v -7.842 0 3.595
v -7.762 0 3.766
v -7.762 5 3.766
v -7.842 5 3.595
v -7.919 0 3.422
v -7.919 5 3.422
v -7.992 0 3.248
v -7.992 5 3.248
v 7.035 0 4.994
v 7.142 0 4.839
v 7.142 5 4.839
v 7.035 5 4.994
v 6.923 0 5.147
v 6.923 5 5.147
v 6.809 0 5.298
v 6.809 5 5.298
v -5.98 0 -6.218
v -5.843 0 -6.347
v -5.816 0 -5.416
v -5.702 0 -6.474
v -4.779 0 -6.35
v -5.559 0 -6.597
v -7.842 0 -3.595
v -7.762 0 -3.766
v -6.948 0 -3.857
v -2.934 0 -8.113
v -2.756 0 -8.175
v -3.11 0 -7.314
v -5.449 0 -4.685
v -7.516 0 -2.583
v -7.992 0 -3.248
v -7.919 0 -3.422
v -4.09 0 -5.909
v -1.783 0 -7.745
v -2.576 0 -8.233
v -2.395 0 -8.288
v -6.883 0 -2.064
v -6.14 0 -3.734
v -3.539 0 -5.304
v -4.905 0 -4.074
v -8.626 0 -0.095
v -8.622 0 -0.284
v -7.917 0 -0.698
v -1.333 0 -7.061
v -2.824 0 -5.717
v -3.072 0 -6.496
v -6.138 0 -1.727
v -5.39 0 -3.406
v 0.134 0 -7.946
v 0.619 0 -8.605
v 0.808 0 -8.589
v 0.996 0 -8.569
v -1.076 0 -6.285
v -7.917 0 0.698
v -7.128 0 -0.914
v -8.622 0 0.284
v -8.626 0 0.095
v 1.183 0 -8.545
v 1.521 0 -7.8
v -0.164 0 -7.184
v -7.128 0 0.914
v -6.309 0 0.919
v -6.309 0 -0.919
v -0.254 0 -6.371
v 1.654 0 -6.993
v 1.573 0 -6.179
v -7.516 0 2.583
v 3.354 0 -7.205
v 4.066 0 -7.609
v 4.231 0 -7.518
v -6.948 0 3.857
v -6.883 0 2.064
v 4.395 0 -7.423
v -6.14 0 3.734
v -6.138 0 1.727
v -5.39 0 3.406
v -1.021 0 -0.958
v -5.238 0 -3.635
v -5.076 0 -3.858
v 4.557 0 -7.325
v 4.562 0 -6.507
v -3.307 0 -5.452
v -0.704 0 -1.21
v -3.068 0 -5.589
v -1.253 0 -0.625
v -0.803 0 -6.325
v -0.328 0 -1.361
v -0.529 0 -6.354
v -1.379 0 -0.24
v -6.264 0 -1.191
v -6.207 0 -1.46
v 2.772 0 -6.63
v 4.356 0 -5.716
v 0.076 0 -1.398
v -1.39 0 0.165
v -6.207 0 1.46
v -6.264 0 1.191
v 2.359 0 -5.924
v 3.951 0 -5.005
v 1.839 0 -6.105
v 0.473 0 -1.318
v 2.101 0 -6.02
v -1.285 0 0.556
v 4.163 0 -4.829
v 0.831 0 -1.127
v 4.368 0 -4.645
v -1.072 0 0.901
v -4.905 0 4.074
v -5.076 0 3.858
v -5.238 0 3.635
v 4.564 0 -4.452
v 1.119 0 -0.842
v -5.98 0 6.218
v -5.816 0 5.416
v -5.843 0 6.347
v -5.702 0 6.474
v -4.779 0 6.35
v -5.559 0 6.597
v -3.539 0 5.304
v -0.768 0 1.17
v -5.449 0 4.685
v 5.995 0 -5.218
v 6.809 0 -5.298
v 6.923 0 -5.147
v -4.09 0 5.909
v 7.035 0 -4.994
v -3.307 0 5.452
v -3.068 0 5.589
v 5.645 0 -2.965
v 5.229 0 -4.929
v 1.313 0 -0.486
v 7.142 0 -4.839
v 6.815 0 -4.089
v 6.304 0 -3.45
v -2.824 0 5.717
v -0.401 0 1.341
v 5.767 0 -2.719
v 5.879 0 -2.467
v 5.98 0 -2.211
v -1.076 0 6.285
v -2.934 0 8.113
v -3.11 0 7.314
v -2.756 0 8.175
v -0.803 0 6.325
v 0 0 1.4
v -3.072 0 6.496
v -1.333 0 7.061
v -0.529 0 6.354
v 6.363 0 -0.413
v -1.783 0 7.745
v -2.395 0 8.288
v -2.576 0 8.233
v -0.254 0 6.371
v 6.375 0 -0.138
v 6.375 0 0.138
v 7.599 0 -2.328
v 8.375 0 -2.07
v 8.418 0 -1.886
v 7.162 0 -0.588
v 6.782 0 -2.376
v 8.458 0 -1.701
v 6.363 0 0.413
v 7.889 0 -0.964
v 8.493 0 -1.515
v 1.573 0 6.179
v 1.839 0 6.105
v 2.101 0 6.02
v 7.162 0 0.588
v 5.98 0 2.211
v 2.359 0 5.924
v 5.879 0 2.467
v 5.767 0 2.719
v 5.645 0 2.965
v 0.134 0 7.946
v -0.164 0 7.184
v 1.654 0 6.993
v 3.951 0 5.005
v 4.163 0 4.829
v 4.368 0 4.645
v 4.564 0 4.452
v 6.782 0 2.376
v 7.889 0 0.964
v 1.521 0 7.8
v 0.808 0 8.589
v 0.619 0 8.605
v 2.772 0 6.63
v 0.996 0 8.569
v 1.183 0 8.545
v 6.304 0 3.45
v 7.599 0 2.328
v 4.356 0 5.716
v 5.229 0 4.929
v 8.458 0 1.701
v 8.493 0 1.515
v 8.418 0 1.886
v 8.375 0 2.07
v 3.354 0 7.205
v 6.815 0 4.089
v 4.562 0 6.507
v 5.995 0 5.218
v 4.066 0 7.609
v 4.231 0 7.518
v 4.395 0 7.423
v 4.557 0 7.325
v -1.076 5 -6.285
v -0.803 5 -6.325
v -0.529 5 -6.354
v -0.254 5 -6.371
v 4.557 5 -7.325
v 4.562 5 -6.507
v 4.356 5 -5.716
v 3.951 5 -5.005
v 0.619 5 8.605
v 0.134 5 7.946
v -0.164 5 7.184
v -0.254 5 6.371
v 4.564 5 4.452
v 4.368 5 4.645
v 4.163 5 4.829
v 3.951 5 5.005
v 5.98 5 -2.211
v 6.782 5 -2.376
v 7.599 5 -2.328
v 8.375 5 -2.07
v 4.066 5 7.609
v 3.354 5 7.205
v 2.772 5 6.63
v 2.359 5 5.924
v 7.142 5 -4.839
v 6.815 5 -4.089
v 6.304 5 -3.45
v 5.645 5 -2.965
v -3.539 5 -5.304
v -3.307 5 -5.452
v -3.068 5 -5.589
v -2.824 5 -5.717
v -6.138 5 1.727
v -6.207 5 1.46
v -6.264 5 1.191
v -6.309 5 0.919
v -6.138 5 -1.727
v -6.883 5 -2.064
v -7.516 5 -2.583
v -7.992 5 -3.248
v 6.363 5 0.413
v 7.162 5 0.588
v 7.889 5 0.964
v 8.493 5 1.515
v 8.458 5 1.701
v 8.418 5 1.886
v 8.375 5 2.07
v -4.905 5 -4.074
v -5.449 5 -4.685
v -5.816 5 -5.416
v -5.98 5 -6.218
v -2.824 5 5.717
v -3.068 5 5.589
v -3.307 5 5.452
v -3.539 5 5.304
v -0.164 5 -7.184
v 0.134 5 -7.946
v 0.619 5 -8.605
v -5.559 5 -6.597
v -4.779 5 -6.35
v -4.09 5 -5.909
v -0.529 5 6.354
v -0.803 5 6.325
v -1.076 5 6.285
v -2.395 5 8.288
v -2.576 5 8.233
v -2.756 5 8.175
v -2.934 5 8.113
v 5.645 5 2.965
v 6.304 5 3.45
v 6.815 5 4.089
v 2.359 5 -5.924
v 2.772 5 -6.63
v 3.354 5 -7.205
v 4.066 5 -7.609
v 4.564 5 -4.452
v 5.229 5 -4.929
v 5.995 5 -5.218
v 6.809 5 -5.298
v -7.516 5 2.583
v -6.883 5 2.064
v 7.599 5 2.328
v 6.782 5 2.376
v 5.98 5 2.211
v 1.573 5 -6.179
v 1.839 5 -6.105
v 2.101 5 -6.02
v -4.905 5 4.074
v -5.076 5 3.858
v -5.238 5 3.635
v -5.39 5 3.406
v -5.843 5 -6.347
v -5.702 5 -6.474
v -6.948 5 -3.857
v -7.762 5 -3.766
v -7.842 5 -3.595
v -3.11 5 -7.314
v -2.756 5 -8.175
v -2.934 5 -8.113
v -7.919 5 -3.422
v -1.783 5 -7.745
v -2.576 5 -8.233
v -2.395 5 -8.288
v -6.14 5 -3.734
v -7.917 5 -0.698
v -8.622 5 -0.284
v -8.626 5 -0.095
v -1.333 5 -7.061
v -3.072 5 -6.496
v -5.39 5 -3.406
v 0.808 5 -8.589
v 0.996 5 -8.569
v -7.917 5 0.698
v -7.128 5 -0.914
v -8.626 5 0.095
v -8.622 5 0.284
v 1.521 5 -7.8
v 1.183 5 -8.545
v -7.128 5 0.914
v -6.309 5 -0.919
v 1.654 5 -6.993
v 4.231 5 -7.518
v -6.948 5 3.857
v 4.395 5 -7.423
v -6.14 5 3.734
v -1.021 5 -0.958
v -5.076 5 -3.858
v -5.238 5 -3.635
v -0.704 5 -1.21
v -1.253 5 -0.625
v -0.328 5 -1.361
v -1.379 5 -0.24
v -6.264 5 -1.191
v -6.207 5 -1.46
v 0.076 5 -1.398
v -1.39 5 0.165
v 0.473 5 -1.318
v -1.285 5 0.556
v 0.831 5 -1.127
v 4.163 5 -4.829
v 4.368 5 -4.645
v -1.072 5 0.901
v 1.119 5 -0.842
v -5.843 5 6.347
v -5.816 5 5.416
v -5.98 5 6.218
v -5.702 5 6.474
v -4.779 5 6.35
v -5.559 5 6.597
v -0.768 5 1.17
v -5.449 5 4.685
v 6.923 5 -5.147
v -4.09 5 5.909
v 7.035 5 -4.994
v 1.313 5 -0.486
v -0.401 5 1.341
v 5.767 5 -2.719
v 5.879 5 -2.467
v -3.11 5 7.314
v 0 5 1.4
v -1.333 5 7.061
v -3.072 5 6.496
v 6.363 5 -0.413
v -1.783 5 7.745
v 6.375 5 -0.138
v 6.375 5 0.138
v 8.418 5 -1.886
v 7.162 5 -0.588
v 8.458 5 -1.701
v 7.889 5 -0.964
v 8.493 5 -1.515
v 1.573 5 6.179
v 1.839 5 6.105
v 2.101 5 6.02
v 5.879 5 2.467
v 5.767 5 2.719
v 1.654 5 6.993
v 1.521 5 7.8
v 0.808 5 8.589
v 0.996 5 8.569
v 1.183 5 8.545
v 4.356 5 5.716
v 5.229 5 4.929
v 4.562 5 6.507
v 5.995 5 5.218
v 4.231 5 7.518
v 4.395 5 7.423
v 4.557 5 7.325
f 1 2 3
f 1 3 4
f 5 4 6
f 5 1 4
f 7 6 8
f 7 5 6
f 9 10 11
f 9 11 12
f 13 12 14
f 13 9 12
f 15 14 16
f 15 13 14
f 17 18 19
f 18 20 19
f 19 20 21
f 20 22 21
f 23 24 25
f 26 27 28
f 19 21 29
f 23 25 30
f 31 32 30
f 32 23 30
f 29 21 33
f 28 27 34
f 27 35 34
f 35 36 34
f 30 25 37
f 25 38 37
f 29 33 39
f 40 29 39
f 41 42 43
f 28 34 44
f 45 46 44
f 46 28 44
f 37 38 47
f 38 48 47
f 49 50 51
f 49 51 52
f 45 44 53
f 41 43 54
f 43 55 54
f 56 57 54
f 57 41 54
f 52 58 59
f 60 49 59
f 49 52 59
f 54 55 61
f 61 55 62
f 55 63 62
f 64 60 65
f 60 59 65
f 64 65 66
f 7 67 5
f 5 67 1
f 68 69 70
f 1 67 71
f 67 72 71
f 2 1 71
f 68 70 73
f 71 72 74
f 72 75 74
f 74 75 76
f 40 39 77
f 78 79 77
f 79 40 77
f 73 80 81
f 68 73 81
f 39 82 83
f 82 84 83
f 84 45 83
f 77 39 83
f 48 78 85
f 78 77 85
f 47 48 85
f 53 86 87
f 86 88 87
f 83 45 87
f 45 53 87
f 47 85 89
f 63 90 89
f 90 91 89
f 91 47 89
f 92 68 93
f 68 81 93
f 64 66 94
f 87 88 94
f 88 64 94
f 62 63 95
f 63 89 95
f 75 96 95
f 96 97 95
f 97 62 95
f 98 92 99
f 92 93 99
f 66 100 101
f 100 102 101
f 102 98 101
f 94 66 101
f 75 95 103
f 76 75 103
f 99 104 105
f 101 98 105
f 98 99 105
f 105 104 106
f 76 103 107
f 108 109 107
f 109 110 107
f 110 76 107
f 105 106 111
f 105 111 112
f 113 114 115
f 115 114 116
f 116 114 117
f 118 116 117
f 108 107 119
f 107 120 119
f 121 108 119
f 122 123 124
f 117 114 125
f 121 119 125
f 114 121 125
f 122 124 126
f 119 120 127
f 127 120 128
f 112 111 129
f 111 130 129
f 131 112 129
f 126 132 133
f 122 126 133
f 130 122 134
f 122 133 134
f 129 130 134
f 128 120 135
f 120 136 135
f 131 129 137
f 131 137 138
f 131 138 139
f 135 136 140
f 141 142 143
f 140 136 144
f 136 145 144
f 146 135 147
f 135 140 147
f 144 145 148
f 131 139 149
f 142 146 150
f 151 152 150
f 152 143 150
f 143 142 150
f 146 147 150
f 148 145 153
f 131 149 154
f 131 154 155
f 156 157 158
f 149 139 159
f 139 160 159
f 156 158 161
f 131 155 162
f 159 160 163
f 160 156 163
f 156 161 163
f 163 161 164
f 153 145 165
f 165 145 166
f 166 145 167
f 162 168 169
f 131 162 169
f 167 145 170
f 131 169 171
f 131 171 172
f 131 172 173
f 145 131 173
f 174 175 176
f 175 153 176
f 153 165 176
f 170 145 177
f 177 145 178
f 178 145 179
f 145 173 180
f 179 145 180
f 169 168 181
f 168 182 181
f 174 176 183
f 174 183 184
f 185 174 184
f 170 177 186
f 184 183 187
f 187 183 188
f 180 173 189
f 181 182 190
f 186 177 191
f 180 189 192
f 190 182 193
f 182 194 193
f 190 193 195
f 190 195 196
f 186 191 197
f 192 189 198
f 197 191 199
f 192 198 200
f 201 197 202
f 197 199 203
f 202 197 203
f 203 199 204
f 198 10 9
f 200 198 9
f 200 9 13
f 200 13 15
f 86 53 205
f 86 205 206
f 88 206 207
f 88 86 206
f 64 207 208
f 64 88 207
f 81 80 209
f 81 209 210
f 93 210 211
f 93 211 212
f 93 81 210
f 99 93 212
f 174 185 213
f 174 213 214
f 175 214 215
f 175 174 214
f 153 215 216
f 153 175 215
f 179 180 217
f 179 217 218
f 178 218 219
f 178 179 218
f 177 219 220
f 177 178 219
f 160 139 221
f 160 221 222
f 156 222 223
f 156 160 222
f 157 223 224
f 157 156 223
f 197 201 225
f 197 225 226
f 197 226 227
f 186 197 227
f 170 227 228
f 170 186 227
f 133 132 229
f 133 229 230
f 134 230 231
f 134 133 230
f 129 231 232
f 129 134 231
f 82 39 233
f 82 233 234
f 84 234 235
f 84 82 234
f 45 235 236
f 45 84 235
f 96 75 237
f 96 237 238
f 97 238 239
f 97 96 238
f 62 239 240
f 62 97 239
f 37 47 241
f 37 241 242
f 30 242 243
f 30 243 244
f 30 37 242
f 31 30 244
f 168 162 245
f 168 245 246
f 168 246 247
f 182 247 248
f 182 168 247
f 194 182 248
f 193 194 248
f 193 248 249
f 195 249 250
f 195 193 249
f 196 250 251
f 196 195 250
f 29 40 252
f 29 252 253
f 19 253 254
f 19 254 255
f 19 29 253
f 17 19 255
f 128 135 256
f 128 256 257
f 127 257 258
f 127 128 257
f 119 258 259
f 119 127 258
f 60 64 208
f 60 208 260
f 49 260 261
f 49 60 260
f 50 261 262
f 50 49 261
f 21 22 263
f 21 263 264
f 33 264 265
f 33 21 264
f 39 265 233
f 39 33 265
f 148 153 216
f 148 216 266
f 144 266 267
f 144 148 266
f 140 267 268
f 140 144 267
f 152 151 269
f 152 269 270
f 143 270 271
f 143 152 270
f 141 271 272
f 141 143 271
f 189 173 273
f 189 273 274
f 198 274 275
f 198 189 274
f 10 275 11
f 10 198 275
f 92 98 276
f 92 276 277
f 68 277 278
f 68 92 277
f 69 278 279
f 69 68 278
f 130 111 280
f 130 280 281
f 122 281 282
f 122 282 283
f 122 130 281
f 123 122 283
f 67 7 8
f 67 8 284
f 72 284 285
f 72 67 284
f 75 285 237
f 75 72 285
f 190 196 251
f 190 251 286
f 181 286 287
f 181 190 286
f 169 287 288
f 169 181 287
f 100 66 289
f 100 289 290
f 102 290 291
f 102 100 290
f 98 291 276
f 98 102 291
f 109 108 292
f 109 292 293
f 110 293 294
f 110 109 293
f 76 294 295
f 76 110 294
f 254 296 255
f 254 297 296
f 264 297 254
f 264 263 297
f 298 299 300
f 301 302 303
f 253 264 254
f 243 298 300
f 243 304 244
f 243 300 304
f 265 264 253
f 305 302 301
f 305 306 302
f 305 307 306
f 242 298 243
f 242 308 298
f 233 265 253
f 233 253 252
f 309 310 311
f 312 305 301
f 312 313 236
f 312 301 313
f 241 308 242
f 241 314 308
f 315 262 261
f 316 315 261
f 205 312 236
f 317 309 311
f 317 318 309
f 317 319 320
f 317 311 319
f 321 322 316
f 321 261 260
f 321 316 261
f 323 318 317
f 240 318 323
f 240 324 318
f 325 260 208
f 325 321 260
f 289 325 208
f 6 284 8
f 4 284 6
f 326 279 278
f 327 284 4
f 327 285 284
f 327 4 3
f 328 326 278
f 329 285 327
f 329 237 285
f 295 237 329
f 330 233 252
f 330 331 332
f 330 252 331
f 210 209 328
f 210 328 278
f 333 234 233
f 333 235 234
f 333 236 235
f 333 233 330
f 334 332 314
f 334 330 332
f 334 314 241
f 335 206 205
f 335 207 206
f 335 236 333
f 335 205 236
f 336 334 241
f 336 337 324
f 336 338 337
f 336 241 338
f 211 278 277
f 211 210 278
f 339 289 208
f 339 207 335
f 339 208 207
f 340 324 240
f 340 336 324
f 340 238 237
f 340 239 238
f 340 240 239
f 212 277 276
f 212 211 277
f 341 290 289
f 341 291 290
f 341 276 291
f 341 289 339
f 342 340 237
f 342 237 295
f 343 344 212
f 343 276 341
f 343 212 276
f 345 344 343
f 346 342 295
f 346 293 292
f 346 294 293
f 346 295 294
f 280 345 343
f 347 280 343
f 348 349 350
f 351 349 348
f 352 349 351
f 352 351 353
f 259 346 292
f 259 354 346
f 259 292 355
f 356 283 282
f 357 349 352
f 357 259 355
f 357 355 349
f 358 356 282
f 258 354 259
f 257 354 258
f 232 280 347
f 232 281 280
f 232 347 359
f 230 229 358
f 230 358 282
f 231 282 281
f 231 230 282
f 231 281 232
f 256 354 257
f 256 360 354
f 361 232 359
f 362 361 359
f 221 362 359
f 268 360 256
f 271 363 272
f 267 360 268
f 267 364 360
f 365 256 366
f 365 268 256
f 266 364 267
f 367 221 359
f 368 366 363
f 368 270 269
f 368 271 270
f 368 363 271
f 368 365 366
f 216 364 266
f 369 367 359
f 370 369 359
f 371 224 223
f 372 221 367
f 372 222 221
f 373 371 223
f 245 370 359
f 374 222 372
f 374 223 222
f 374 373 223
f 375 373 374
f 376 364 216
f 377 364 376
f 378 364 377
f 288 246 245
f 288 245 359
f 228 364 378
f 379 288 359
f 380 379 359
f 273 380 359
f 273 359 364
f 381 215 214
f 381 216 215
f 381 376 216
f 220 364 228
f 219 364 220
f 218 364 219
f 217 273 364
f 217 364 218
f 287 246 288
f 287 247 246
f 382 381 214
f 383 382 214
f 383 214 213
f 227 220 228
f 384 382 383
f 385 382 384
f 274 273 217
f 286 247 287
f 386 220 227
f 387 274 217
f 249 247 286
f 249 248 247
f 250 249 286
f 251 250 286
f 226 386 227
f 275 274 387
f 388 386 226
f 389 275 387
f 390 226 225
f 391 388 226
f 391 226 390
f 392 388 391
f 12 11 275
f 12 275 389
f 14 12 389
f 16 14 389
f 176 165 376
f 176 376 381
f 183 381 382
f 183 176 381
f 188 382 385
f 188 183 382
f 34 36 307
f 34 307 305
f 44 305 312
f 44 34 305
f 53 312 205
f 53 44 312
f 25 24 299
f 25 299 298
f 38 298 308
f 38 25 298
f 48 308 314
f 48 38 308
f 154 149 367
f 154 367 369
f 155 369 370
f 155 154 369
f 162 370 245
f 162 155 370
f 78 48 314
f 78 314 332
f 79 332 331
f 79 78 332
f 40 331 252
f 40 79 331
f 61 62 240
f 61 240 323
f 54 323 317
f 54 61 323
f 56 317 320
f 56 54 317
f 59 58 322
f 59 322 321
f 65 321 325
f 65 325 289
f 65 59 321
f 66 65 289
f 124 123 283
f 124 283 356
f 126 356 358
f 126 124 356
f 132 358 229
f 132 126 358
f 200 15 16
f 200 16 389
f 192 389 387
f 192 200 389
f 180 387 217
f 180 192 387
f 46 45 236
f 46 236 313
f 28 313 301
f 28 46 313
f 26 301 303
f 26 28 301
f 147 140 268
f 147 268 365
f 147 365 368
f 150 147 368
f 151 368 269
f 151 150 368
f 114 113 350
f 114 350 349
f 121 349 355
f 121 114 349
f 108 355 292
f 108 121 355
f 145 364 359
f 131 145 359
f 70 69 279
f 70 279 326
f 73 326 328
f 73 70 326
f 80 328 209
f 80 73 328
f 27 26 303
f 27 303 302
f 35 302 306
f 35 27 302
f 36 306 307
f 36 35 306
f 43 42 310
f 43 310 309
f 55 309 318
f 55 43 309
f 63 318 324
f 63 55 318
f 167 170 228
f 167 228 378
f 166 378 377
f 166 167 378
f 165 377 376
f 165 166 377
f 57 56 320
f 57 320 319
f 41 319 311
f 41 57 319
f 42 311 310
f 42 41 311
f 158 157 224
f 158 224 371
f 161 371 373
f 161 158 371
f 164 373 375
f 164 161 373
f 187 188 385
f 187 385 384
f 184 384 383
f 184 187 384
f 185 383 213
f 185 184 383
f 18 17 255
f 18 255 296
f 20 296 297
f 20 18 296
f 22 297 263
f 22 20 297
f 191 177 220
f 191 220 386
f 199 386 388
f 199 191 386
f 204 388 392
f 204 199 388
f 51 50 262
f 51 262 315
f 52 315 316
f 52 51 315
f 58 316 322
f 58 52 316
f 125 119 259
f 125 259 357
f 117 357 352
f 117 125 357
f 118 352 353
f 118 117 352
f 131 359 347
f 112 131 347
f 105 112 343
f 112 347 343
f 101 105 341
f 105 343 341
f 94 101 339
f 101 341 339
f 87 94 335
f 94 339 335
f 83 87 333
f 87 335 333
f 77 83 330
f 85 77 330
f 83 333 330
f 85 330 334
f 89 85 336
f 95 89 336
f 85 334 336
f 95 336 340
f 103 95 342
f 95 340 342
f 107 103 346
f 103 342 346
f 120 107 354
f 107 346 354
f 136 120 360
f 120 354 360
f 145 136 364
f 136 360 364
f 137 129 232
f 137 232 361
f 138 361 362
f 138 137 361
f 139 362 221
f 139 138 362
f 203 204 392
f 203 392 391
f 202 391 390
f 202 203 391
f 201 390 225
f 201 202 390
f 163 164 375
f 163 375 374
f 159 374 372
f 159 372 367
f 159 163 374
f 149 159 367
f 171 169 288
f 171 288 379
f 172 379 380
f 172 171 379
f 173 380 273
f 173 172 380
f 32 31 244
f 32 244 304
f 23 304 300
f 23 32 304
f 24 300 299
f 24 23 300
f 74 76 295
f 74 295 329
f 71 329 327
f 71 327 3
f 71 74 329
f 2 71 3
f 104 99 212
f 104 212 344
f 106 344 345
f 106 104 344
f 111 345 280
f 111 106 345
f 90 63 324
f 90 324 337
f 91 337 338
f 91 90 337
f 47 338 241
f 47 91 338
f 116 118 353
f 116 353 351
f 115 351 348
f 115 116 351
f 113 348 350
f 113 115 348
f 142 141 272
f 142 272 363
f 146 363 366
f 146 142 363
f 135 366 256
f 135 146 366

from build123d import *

# Parameters (mm, degrees)
SKETCH1_R           = 56.531668112
BOSS_EXTRUDE1_DEPTH = 5
SKETCH2_R           = 93.360470672
CUT_EXTRUDE1_DEPTH  = 83.481553238
CUT_EXTRUDE2_DEPTH  = 93.989824493


with BuildPart() as part:
    # Sketch1 → Boss-Extrude1 (new body)
    with BuildSketch(Plane(origin=(0, 0, 0), x_dir=(1, 0, 0), z_dir=(0, 1, 0))):
        Circle(SKETCH1_R)
    extrude(amount=BOSS_EXTRUDE1_DEPTH)

    # Sketch2 → Cut-Extrude1 (cut, through all)
    with BuildSketch(Plane(origin=(0.053951493, 9.696123263, -2.690451675), x_dir=(0, 0, 1), z_dir=(0, 1, 0))):
        with Locations((2.690451675, -0.053951493)):
            Circle(SKETCH2_R)
        with BuildLine():
            ThreePointArc((7.987976033, 6.754966533), (7.789005891, 5.548363877), (7.142485611, 4.510341424))
            ThreePointArc((7.142485611, 4.510341424), (7.428743082, 4.212425253), (7.695105184, 3.89659521))
            ThreePointArc((7.695105184, 3.89659521), (8.795021012, 4.431070894), (10.015811815, 4.502826734))
            ThreePointArc((10.015811815, 4.502826734), (10.161652833, 4.259548507), (10.299417449, 4.011607367))
            ThreePointArc((10.299417449, 4.011607367), (9.626879667, 2.990249439), (8.614052233, 2.304932231))
            ThreePointArc((8.614052233, 2.304932231), (8.754388023, 1.916340863), (8.869262259, 1.519476535))
            ThreePointArc((8.869262259, 1.519476535), (10.091476214, 1.560368296), (11.235909836, 1.129380165))
            ThreePointArc((11.235909836, 1.129380165), (11.270192066, 0.84781556), (11.295199558, 0.56527614))
            ThreePointArc((11.295199558, 0.56527614), (10.265382027, -0.094234996), (9.061374505, -0.308349388))
            ThreePointArc((9.061374505, -0.308349388), (9.03152328, -0.720424975), (8.975046852, -1.12970214))
            ThreePointArc((8.975046852, -1.12970214), (10.108227036, -1.589464859), (10.978420508, -2.448675198))
            ThreePointArc((10.978420508, -2.448675198), (10.895216241, -2.719841104), (10.803142587, -2.98812517))
            ThreePointArc((10.803142587, -2.98812517), (9.594110113, -3.171754047), (8.407106342, -2.8776433))
            ThreePointArc((8.407106342, -2.8776433), (8.212229649, -3.241951493), (7.994167845, -3.592873756))
            ThreePointArc((7.994167845, -3.592873756), (8.84237711, -4.473793803), (9.287866075, -5.612661077))
            ThreePointArc((9.287866075, -5.612661077), (9.101562084, -5.826541234), (8.908327655, -6.034181196))
            ThreePointArc((8.908327655, -6.034181196), (7.729132938, -5.710176712), (6.764376652, -4.958695246))
            ThreePointArc((6.764376652, -4.958695246), (6.438170443, -5.212243849), (6.09622813, -5.444133562))
            ThreePointArc((6.09622813, -5.444133562), (6.512803388, -6.593891859), (6.456558756, -7.81549557))
            ThreePointArc((6.456558756, -7.81549557), (6.199368695, -7.935108156), (5.938385479, -8.046201177))
            ThreePointArc((5.938385479, -8.046201177), (4.992921997, -7.270586652), (4.417228324, -6.191672439))
            ThreePointArc((4.417228324, -6.191672439), (4.016096616, -6.290620595), (3.609398725, -6.363381921))
            ThreePointArc((3.609398725, -6.363381921), (3.52231033, -7.583174812), (2.974057309, -8.67628858))
            ThreePointArc((2.974057309, -8.67628858), (2.690451675, -8.680951493), (2.406846041, -8.67628858))
            ThreePointArc((2.406846041, -8.67628858), (1.85859302, -7.583174812), (1.771504625, -6.363381921))
            ThreePointArc((1.771504625, -6.363381921), (1.364806734, -6.290620595), (0.963675026, -6.191672439))
            ThreePointArc((0.963675026, -6.191672439), (0.387981353, -7.270586652), (-0.557482129, -8.046201177))
            ThreePointArc((-0.557482129, -8.046201177), (-0.818465345, -7.935108156), (-1.075655406, -7.81549557))
            ThreePointArc((-1.075655406, -7.81549557), (-1.131900038, -6.593891859), (-0.71532478, -5.444133562))
            ThreePointArc((-0.71532478, -5.444133562), (-1.057267094, -5.212243849), (-1.383473303, -4.958695246))
            ThreePointArc((-1.383473303, -4.958695246), (-2.348229588, -5.710176712), (-3.527424305, -6.034181196))
            ThreePointArc((-3.527424305, -6.034181196), (-3.720658735, -5.826541234), (-3.906962725, -5.612661077))
            ThreePointArc((-3.906962725, -5.612661077), (-3.46147376, -4.473793803), (-2.613264496, -3.592873756))
            ThreePointArc((-2.613264496, -3.592873756), (-2.8313263, -3.241951493), (-3.026202992, -2.8776433))
            ThreePointArc((-3.026202992, -2.8776433), (-4.213206764, -3.171754047), (-5.422239237, -2.98812517))
            ThreePointArc((-5.422239237, -2.98812517), (-5.514312891, -2.719841104), (-5.597517158, -2.448675198))
            ThreePointArc((-5.597517158, -2.448675198), (-4.727323686, -1.589464859), (-3.594143503, -1.12970214))
            ThreePointArc((-3.594143503, -1.12970214), (-3.65061993, -0.720424975), (-3.680471156, -0.308349388))
            ThreePointArc((-3.680471156, -0.308349388), (-4.884478677, -0.094234996), (-5.914296209, 0.56527614))
            ThreePointArc((-5.914296209, 0.56527614), (-5.889288716, 0.84781556), (-5.855006486, 1.129380165))
            ThreePointArc((-5.855006486, 1.129380165), (-4.710572864, 1.560368296), (-3.48835891, 1.519476535))
            ThreePointArc((-3.48835891, 1.519476535), (-3.373484673, 1.916340863), (-3.233148884, 2.304932231))
            ThreePointArc((-3.233148884, 2.304932231), (-4.245976317, 2.990249439), (-4.9185141, 4.011607367))
            ThreePointArc((-4.9185141, 4.011607367), (-4.780749484, 4.259548507), (-4.634908466, 4.502826734))
            ThreePointArc((-4.634908466, 4.502826734), (-3.414117662, 4.431070894), (-2.314201834, 3.89659521))
            ThreePointArc((-2.314201834, 3.89659521), (-2.047839732, 4.212425253), (-1.761582261, 4.510341424))
            ThreePointArc((-1.761582261, 4.510341424), (-2.408102542, 5.548363877), (-2.607072683, 6.754966533))
            ThreePointArc((-2.607072683, 6.754966533), (-2.380371697, 6.925438117), (-2.148189128, 7.088364951))
            ThreePointArc((-2.148189128, 7.088364951), (-1.062126964, 6.526272375), (-0.274694701, 5.590628471))
            ThreePointArc((-0.274694701, 5.590628471), (0.097098839, 5.770814345), (0.479781475, 5.926542907))
            ThreePointArc((0.479781475, 5.926542907), (0.311357577, 7.137787092), (0.620358822, 8.321001915))
            ThreePointArc((0.620358822, 8.321001915), (0.896797518, 8.384527858), (1.175175163, 8.438931768))
            ThreePointArc((1.175175163, 8.438931768), (1.938718671, 7.483693371), (2.277513178, 6.308662576))
            ThreePointArc((2.277513178, 6.308662576), (2.690451675, 6.322048507), (3.103390171, 6.308662576))
            ThreePointArc((3.103390171, 6.308662576), (3.442184678, 7.483693371), (4.205728187, 8.438931768))
            ThreePointArc((4.205728187, 8.438931768), (4.484105832, 8.384527858), (4.760544528, 8.321001915))
            ThreePointArc((4.760544528, 8.321001915), (5.069545773, 7.137787092), (4.901121875, 5.926542907))
            ThreePointArc((4.901121875, 5.926542907), (5.283804511, 5.770814345), (5.65559805, 5.590628471))
            ThreePointArc((5.65559805, 5.590628471), (6.443030314, 6.526272375), (7.529092477, 7.088364951))
            ThreePointArc((7.529092477, 7.088364951), (7.761275046, 6.925438117), (7.987976033, 6.754966533))
        make_face(mode=Mode.SUBTRACT)
    extrude(amount=-CUT_EXTRUDE1_DEPTH, mode=Mode.SUBTRACT)

    # Sketch4 → Cut-Extrude2 (cut, through all)
    with BuildSketch(Plane(origin=(64.693992366, 5.1354, -48.358110231), x_dir=(1, 0, 0), z_dir=(0, 1, 0))):
        with BuildLine():
            Line((-64.693992366, -49.758110231), (-63.380949475, -47.872395945))
            ThreePointArc((-63.380949475, -47.872395945), (-65.842904895, -47.558110231), (-64.693992366, -49.758110231))
        make_face()
    extrude(amount=-CUT_EXTRUDE2_DEPTH, mode=Mode.SUBTRACT)


solid = part.part
